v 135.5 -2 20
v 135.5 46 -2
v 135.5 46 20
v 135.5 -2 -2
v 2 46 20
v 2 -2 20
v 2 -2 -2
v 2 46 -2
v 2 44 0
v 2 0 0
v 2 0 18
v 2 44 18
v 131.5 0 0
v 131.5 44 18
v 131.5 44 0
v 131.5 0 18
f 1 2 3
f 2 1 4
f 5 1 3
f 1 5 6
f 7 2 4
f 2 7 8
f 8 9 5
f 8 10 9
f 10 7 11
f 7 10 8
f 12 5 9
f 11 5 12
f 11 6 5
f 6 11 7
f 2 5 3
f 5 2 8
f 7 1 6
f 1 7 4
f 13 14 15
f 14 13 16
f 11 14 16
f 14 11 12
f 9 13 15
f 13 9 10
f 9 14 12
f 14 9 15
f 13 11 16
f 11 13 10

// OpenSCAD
//Horizontal amount of bars
hori_bars = 1; // [1:1:20]

//Vertical amount of bars
vert_bars = 1; // [1:1:30]

//End of customizer variables

//Box
//15 long
//24 wide / 5 bars
//7.5 hight / 4 bars

//Bar
//4cm wide
//11.3 long
//1.7 high

//Average
//13.15 long
//4.4 wide
//1.8 high

h=18;
b=44;
l=131.5;

module multiBar(x, y){
  difference(){
    translate([2,-2,-2]){
      cube([l+2, x*(b+2)+2, y*(h+2)+2]);
    }
    for( i=[0:x-1]){
      for( j=[0:y-1]){
        translate([0,i*(b+2),j*(h+2)]){
          cube([l, b, h]);
        }
      }
    }
  }
}

multiBar(hori_bars, vert_bars);
